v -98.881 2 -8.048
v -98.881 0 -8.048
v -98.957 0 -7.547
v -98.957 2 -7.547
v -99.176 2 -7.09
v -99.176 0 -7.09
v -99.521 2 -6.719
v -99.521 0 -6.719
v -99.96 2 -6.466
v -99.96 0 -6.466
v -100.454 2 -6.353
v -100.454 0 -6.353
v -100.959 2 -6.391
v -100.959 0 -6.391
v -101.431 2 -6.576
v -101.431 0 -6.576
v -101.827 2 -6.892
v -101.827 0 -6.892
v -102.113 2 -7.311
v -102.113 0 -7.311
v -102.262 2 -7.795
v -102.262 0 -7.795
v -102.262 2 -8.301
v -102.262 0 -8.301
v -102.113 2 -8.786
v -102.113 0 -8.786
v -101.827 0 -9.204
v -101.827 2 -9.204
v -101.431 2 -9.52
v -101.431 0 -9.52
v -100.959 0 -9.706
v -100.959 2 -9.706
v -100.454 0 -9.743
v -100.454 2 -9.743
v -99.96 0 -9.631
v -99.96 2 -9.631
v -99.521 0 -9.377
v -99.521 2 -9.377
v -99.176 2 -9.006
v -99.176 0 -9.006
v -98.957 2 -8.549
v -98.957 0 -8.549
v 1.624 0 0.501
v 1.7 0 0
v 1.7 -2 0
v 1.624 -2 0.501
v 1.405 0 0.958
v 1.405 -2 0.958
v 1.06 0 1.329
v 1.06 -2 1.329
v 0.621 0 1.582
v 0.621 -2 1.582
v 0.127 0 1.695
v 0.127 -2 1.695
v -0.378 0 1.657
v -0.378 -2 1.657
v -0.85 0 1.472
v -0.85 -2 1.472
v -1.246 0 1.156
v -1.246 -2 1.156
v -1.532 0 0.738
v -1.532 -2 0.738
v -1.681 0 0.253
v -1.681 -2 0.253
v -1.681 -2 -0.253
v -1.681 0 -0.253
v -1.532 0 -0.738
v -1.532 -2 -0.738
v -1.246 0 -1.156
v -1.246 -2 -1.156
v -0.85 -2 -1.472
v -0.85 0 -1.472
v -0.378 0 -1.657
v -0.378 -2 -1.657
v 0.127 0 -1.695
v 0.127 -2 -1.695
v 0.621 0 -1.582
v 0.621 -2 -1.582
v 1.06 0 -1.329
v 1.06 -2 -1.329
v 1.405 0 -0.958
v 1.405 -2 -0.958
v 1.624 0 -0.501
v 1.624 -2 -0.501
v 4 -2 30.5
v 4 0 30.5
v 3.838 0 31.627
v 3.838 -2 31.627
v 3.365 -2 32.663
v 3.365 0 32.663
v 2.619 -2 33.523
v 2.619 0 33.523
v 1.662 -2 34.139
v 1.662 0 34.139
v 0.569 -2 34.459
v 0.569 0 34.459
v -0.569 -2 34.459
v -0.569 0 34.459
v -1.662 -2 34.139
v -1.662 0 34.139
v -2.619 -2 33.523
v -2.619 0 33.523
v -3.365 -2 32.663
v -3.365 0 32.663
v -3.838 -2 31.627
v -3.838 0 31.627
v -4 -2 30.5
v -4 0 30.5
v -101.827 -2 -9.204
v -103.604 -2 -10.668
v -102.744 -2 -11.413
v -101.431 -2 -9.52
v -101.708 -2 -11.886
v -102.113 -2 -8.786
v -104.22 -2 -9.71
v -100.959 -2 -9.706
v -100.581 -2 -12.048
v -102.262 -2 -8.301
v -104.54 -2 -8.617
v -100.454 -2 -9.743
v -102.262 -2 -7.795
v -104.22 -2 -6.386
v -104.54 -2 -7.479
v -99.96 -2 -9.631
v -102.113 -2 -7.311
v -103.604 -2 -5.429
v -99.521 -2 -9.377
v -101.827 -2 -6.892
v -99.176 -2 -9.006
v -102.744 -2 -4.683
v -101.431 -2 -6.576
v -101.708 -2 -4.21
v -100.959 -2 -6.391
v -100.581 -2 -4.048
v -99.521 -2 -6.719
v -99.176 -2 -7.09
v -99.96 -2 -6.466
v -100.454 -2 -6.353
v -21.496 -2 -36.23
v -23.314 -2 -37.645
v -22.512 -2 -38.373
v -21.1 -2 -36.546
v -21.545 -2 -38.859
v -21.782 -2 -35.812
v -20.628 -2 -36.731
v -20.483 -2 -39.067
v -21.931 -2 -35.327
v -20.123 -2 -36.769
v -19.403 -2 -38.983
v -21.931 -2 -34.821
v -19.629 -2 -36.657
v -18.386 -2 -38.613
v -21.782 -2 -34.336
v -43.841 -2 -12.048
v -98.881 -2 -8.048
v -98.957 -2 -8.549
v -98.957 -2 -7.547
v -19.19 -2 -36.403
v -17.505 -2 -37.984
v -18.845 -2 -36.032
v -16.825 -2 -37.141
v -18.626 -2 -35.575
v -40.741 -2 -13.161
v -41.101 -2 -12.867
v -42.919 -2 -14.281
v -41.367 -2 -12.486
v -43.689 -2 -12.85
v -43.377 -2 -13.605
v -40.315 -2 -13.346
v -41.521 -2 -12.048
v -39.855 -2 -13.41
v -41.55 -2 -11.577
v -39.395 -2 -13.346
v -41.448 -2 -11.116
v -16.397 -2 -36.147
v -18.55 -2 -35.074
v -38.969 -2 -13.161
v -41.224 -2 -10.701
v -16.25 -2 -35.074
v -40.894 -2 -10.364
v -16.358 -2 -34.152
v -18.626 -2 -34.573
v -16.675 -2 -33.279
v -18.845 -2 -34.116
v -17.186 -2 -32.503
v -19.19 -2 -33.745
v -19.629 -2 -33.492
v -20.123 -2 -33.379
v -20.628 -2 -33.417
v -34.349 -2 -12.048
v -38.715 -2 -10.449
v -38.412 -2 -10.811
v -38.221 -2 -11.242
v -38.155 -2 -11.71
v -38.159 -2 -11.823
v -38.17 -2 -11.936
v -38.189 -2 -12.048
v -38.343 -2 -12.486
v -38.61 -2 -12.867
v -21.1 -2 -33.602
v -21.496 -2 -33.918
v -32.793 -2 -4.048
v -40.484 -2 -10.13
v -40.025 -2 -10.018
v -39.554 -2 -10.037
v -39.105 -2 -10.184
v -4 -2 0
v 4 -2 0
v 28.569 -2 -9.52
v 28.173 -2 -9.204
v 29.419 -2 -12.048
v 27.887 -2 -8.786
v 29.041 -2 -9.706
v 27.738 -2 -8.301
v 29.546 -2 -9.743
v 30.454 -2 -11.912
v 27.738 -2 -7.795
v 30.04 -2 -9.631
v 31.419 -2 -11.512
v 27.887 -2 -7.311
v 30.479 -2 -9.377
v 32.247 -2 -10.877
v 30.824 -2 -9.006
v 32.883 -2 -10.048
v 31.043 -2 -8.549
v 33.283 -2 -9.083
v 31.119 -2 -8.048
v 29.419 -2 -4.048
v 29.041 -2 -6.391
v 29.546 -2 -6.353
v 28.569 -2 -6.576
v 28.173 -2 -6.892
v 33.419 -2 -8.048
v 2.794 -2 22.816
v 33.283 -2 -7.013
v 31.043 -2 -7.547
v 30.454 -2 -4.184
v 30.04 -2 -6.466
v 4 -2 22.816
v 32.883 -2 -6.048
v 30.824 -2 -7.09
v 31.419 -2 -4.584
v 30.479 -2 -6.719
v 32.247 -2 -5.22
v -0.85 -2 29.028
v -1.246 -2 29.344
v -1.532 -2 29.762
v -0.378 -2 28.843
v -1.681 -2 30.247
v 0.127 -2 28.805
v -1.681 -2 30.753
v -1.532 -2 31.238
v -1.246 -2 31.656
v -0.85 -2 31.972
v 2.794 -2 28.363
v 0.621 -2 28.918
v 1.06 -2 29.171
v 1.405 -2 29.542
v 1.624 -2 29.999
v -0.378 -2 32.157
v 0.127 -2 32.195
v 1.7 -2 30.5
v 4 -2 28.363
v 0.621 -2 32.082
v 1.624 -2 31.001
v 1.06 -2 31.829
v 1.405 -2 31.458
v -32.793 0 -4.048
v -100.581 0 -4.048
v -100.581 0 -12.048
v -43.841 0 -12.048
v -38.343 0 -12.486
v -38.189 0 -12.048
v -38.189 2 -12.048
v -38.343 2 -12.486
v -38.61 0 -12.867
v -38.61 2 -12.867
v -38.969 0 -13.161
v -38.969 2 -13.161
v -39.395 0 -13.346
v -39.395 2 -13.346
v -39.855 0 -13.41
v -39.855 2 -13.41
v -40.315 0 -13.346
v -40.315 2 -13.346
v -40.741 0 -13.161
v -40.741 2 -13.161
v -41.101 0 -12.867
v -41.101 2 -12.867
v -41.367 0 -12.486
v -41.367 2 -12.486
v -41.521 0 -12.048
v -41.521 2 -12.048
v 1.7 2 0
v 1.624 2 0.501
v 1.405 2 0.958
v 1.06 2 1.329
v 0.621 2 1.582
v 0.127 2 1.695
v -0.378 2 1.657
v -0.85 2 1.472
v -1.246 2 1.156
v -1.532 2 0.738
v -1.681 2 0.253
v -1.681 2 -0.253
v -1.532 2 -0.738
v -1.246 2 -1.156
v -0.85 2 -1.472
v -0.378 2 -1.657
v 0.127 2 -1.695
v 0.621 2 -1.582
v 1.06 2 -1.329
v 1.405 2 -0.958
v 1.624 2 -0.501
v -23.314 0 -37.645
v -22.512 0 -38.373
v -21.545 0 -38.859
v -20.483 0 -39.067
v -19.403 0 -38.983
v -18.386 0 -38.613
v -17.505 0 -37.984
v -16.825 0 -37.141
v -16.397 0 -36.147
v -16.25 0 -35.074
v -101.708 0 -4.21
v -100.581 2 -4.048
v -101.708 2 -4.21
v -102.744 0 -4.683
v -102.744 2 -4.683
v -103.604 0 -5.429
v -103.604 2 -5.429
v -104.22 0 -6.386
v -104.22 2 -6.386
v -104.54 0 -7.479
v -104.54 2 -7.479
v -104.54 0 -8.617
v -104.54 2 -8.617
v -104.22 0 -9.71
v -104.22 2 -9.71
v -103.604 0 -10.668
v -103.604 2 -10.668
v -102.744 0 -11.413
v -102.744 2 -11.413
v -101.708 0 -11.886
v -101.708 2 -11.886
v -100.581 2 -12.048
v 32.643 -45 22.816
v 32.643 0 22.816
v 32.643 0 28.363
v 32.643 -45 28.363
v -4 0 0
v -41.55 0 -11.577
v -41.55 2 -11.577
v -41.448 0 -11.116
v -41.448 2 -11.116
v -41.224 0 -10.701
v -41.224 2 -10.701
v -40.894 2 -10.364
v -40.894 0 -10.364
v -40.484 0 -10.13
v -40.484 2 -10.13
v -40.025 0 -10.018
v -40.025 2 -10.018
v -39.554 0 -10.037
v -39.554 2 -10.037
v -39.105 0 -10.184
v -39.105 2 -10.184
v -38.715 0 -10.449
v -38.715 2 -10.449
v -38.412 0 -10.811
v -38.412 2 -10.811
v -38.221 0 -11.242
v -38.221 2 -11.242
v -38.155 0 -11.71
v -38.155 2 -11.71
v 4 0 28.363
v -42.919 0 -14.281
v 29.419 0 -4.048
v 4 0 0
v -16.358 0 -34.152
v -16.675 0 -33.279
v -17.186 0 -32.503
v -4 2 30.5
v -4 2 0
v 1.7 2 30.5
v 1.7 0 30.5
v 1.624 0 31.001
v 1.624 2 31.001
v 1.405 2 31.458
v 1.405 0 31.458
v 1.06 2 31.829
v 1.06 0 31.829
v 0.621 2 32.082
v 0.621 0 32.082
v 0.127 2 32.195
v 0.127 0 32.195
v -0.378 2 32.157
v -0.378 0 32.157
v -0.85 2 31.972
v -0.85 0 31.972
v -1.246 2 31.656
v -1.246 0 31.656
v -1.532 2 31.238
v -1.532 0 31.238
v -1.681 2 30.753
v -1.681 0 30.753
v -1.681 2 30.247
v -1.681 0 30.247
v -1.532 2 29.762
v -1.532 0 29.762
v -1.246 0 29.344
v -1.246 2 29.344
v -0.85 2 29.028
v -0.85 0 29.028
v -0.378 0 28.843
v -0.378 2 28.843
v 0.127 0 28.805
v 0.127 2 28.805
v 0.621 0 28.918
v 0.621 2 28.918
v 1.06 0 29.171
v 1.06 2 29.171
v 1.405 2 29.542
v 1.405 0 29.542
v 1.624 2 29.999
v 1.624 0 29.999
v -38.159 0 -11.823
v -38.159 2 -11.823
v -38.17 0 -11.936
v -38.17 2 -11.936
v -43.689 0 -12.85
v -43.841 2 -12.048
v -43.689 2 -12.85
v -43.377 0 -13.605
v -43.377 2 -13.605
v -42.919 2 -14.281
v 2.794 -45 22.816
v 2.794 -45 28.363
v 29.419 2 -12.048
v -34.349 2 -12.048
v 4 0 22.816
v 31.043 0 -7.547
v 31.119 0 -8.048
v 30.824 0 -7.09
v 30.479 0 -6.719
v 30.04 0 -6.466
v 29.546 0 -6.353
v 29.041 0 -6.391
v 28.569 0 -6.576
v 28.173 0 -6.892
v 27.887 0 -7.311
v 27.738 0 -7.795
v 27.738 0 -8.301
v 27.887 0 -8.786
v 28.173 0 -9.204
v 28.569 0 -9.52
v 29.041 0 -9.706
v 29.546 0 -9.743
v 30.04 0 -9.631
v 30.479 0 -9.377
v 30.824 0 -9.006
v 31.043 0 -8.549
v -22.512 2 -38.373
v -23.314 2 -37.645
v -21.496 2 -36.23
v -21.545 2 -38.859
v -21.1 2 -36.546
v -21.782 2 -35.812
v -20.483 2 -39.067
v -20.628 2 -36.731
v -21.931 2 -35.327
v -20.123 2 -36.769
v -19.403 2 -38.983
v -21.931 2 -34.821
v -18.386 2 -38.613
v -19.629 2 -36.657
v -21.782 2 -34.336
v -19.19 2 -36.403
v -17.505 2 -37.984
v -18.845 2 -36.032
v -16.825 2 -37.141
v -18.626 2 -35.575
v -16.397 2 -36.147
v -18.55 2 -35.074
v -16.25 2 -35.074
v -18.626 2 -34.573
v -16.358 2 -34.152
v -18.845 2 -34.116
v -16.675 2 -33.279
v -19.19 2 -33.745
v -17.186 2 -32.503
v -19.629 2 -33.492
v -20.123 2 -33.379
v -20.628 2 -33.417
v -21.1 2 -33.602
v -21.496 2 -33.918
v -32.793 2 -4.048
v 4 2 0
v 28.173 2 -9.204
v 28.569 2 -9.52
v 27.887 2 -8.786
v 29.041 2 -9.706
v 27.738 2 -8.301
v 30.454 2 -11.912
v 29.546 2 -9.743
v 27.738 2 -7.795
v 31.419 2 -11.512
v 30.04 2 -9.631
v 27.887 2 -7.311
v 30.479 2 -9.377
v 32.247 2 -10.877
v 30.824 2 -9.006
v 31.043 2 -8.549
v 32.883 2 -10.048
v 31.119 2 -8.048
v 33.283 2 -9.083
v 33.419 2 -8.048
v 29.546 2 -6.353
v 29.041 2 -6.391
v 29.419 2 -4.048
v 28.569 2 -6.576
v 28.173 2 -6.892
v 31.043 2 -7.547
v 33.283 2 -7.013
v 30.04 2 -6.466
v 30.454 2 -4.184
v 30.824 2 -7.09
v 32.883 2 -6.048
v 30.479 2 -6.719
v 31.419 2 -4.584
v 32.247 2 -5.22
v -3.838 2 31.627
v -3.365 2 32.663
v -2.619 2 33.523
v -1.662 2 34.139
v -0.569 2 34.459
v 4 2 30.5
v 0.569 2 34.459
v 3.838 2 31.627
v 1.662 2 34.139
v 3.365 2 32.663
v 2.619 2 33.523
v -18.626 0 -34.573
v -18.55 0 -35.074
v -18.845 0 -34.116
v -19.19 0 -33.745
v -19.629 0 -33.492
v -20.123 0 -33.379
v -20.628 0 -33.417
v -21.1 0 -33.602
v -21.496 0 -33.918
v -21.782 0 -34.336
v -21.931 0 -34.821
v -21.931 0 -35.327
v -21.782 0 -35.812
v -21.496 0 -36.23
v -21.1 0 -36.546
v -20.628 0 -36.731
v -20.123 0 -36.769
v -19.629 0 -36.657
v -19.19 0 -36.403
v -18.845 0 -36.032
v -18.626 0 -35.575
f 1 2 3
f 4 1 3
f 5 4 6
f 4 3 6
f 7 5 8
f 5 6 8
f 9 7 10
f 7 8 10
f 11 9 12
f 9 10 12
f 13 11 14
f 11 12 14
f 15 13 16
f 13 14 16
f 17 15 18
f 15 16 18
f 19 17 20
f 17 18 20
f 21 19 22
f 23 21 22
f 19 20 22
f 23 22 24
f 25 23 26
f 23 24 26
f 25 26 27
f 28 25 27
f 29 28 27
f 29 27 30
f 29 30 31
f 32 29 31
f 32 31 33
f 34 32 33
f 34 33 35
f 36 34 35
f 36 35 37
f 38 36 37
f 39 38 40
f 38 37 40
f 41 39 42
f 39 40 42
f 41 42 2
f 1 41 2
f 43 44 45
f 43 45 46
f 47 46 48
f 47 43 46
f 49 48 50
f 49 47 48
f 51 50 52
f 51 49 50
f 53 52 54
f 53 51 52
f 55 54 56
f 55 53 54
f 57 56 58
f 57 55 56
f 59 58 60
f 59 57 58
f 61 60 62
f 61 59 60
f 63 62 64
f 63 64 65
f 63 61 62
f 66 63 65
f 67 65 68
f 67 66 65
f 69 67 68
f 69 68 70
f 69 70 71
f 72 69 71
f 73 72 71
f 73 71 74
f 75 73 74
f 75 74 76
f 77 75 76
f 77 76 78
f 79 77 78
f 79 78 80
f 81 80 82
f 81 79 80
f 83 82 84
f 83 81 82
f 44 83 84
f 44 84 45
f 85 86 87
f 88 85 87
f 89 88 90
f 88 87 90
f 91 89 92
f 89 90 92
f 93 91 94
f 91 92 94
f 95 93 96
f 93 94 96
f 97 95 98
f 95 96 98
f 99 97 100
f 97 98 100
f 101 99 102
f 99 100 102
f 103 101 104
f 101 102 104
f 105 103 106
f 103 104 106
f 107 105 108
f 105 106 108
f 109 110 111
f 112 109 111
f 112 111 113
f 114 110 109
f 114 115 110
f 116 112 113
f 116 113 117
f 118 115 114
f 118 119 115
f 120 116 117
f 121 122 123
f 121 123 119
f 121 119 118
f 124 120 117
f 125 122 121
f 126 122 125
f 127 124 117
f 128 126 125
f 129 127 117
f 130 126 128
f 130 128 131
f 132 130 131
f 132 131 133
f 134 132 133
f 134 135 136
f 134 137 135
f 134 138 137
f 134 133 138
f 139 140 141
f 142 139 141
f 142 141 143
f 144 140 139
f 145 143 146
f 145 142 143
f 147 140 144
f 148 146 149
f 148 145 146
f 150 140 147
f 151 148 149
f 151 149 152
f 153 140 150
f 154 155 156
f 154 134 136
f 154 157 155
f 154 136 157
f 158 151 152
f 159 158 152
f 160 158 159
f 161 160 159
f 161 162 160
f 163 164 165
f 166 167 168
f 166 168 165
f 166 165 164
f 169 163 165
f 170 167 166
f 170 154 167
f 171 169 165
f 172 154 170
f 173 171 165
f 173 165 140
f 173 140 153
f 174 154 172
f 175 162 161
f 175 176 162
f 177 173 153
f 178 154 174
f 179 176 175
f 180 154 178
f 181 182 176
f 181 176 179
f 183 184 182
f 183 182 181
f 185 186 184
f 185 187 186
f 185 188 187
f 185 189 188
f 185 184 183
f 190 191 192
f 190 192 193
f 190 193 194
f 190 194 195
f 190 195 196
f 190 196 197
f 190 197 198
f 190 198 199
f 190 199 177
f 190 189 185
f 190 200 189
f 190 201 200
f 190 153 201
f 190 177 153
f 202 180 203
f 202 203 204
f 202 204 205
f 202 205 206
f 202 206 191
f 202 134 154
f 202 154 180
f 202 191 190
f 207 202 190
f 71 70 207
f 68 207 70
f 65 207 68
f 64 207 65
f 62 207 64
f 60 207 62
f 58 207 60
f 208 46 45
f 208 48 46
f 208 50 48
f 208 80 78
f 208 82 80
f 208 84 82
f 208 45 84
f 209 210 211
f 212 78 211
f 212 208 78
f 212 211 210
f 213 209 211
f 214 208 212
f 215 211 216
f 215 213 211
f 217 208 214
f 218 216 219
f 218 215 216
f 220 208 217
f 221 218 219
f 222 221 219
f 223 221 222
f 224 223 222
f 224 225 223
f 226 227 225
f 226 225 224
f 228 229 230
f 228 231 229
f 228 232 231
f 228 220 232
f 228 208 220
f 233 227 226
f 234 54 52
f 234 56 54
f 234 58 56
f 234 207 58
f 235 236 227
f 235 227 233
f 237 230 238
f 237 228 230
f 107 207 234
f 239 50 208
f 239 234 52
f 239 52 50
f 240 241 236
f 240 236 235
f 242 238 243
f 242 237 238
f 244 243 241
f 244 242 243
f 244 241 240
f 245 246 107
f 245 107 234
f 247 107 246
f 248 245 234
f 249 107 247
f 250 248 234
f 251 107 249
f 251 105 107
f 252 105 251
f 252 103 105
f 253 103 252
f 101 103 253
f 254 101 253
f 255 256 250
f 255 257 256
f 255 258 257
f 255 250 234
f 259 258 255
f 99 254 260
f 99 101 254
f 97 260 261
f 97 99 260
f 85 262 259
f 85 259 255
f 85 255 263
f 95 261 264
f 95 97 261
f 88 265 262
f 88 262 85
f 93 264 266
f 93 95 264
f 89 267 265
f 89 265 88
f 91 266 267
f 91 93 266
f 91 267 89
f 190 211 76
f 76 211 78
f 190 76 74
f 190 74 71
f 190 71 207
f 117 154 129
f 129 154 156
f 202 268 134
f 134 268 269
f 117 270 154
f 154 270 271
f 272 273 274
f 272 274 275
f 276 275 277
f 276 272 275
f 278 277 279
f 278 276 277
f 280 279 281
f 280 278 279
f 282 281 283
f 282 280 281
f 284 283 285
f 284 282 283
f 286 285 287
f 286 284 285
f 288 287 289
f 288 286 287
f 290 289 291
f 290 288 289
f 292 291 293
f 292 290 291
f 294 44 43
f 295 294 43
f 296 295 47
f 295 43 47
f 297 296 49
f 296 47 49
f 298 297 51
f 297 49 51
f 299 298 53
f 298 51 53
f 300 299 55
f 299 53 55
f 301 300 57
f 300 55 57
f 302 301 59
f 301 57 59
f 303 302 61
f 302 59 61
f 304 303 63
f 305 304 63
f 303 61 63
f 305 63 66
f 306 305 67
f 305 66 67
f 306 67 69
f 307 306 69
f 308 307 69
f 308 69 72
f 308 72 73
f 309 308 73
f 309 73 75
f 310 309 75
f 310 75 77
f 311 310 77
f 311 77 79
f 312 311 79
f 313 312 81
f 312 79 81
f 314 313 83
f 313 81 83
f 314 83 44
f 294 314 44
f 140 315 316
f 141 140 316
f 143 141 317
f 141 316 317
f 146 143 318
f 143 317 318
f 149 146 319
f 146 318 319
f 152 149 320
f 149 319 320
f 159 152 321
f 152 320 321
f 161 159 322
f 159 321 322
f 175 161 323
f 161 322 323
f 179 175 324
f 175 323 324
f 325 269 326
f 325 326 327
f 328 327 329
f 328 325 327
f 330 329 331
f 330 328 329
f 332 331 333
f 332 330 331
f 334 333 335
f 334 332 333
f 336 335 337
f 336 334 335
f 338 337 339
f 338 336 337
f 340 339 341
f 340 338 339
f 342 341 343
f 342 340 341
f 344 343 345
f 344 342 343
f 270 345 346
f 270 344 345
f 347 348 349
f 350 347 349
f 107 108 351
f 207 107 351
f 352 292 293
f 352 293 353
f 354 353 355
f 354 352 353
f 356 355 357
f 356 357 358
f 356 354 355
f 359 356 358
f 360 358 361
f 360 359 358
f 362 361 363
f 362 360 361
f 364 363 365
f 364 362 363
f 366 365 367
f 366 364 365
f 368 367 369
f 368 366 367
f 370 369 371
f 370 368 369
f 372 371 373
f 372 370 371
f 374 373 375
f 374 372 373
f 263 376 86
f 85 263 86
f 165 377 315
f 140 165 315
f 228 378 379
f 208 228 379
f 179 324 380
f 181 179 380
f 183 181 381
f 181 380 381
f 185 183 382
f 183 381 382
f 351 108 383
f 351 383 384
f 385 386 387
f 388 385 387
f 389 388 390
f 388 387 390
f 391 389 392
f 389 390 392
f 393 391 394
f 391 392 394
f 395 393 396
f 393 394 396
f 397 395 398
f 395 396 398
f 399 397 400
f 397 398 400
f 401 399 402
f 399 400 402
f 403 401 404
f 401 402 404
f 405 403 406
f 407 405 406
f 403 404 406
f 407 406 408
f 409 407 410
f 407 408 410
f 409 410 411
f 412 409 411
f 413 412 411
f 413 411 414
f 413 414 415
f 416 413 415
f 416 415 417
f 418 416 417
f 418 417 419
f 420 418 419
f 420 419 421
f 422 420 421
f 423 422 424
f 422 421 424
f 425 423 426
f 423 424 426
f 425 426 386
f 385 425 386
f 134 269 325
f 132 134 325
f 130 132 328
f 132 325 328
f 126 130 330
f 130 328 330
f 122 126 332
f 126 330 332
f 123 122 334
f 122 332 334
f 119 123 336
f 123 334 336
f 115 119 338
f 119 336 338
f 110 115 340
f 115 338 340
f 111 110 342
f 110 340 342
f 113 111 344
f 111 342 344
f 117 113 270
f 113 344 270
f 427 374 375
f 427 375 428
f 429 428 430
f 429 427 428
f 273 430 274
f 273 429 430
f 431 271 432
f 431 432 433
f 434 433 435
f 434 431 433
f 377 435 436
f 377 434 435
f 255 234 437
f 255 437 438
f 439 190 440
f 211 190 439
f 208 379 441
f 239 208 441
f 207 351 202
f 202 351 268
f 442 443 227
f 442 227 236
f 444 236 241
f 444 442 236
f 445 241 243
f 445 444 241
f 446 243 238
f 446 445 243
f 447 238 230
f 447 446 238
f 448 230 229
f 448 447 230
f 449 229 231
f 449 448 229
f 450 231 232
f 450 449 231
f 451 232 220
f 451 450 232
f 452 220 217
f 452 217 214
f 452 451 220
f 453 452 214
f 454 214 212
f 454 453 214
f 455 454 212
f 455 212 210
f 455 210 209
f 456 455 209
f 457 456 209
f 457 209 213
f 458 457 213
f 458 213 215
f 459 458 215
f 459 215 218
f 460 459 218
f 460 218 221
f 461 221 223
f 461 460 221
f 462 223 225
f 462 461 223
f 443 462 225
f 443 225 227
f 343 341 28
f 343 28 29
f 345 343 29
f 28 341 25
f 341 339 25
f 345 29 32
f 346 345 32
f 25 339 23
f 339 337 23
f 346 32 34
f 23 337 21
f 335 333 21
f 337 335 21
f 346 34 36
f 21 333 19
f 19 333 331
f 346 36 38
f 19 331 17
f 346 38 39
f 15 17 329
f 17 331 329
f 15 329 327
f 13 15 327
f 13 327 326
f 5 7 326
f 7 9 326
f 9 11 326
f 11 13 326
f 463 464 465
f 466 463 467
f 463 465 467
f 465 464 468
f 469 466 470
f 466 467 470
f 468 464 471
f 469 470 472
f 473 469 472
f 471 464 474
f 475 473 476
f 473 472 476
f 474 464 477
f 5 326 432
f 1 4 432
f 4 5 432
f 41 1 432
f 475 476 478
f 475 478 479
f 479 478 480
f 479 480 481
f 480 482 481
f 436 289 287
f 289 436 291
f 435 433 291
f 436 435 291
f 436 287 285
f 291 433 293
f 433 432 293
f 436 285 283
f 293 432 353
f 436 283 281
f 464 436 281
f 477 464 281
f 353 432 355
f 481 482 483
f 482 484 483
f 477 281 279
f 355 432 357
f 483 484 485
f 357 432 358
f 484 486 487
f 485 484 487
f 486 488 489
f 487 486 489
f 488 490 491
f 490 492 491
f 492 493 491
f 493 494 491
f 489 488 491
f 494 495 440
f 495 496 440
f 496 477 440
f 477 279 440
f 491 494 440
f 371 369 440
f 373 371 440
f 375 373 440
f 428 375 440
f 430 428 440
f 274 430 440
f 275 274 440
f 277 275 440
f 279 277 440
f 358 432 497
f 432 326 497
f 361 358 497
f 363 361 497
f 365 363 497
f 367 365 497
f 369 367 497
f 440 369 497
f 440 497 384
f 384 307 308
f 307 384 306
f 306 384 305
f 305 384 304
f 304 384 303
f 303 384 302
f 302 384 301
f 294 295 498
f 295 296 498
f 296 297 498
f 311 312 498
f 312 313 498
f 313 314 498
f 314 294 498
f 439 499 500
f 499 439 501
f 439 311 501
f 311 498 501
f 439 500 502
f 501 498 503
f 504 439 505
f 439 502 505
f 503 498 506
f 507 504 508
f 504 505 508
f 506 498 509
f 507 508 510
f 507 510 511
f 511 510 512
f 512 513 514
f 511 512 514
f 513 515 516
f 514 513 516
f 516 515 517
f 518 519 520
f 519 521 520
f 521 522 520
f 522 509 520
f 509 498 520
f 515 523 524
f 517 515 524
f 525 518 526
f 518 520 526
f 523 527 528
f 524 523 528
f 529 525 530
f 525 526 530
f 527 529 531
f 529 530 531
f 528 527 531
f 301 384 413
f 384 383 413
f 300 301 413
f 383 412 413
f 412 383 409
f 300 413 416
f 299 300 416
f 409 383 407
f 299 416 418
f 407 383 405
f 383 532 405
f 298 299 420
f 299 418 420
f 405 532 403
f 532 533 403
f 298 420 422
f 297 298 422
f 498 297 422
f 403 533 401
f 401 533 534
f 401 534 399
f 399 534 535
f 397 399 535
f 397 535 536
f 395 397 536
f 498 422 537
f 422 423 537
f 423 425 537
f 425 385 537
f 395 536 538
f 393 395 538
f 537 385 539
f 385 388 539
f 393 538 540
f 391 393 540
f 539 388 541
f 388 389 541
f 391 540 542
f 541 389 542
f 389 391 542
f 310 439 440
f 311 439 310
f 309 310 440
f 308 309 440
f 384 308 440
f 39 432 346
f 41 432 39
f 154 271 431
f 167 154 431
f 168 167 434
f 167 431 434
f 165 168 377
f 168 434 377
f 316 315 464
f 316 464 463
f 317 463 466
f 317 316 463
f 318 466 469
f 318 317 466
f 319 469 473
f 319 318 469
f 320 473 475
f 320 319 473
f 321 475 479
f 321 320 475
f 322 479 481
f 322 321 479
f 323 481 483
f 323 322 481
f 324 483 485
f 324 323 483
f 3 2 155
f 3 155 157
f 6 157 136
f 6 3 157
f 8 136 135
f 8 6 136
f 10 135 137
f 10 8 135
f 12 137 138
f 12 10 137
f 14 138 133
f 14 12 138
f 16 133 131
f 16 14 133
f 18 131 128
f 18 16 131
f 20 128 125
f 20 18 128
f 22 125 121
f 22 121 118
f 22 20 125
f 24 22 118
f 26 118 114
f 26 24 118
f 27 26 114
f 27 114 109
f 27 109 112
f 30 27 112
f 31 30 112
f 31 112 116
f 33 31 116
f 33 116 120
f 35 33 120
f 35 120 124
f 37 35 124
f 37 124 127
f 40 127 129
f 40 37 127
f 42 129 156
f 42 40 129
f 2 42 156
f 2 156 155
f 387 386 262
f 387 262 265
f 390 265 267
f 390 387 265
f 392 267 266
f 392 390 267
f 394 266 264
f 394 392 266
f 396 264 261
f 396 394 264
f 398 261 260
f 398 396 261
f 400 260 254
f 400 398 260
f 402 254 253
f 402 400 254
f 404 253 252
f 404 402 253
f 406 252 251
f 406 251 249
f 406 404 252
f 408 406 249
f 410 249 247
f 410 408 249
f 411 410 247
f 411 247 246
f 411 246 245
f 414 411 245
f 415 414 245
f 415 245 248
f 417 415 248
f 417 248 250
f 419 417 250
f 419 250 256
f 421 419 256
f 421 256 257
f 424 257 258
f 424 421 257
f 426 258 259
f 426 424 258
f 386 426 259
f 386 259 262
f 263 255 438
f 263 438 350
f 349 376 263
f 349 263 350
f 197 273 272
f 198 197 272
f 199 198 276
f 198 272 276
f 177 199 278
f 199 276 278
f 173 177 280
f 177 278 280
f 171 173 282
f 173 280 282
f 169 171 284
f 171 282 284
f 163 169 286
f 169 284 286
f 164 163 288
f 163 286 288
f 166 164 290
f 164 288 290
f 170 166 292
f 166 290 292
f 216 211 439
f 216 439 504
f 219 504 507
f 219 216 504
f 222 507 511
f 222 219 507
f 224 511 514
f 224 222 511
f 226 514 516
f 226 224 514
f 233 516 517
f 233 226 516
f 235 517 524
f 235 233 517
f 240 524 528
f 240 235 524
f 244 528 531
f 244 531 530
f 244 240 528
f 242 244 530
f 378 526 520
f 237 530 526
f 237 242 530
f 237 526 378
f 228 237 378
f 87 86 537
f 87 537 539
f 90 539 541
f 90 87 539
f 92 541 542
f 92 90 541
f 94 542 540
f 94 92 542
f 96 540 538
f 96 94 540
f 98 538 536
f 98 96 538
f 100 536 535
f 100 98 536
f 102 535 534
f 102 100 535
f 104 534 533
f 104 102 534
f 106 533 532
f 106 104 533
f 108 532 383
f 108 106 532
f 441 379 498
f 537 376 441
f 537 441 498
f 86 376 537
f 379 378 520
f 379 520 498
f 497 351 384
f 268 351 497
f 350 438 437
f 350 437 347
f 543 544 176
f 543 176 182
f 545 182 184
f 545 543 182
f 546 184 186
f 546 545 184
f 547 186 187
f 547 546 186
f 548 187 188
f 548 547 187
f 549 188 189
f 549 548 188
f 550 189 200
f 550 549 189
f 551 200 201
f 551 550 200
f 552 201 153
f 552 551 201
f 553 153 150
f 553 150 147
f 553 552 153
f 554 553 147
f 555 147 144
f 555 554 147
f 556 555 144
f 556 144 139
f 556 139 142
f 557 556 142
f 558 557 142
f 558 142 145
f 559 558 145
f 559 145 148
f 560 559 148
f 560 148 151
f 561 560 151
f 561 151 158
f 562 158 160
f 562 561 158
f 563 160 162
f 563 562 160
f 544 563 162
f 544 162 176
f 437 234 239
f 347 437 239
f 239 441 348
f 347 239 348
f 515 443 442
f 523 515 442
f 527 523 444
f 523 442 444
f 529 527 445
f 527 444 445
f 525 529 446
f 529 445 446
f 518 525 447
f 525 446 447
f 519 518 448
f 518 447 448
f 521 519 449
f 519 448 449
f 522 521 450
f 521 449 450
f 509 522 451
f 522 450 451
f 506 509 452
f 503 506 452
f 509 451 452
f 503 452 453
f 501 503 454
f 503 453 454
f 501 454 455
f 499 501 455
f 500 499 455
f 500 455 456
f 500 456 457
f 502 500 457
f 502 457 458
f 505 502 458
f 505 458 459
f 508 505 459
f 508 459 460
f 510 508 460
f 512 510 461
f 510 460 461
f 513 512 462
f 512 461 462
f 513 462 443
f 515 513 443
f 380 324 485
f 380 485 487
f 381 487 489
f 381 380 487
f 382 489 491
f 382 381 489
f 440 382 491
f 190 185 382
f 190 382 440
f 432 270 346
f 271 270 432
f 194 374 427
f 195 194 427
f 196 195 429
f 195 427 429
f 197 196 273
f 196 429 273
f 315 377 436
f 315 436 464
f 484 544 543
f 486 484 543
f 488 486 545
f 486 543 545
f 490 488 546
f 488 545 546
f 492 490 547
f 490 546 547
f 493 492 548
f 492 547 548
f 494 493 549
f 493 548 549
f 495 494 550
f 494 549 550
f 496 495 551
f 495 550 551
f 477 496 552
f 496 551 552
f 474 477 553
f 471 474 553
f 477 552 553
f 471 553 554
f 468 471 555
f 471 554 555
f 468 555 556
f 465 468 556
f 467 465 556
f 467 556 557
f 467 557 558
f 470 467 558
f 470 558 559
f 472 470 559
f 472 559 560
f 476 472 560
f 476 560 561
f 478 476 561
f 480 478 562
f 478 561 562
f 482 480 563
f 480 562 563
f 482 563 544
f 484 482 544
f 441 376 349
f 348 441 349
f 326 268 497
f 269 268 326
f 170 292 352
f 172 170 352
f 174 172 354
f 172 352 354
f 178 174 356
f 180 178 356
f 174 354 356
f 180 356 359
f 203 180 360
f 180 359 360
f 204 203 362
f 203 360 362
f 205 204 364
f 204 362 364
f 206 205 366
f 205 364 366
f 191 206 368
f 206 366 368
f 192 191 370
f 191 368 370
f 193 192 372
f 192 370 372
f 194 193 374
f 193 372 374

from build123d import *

# Parameters (mm, degrees)
F1_R     = 1.7
F2_DEPTH = 2
F3_W     = 29.8484290563
F3_H     = 5.5467073855
F4_DEPTH = 45


with BuildPart() as f2:
    # F1 (on Front) → F2 (new body, symmetric)
    with BuildSketch(Plane.XZ):
        with BuildLine():
            ThreePointArc((-41.5209898099, -12.0481280239), (-40.0251027901, -10.0182028071), (-38.1550220954, -11.7096733381))
            ThreePointArc((-38.1550220954, -11.7096733381), (-38.1635515644, -11.8797540328), (-38.189054381, -12.0481280239))
            Line((-38.189054381, -12.0481280239), (-35.8693667634, -12.0481280239))
            ThreePointArc((-35.8693667634, -12.0481280239), (-35.8586098715, -11.8790526048), (-35.8550220954, -11.7096733381))
            ThreePointArc((-35.8550220954, -11.7096733381), (-36.0962516123, -10.3415927648), (-36.790844323, -9.1385228994))
            ThreePointArc((-36.790844323, -9.1385228994), (-41.381040024, -8.0122053827), (-43.8406774275, -12.0481280239))
            Line((-43.8406774275, -12.0481280239), (-41.5209898099, -12.0481280239))
        make_face()
        with BuildLine():
            ThreePointArc((-38.189054381, -12.0481280239), (-39.8550220954, -13.4096733381), (-41.5209898099, -12.0481280239))
            Line((-41.5209898099, -12.0481280239), (-43.8406774275, -12.0481280239))
            ThreePointArc((-43.8406774275, -12.0481280239), (-43.5524900509, -13.2356912667), (-42.9191998679, -14.2808237769))
            ThreePointArc((-42.9191998679, -14.2808237769), (-38.6473330608, -15.5230035357), (-35.8693667634, -12.0481280239))
            Line((-35.8693667634, -12.0481280239), (-38.189054381, -12.0481280239))
        make_face()
        with BuildLine():
            Line((-100.580998737, -12.0481280239), (-43.8406774275, -12.0481280239))
            ThreePointArc((-43.8406774275, -12.0481280239), (-41.381040024, -8.0122053827), (-36.790844323, -9.1385228994))
            Line((-36.790844323, -9.1385228994), (-34.3493957361, -12.0481280239))
            Line((-34.3493957361, -12.0481280239), (29.419001263, -12.0481280239))
            ThreePointArc((29.419001263, -12.0481280239), (25.419001263, -8.0481280239), (29.419001263, -4.0481280239))
            Line((29.419001263, -4.0481280239), (-32.7925062924, -4.0481280239))
            Line((-32.7925062924, -4.0481280239), (-100.580998737, -4.0481280239))
            ThreePointArc((-100.580998737, -4.0481280239), (-97.7525716123, -5.2197008992), (-96.580998737, -8.0481280239))
            ThreePointArc((-96.580998737, -8.0481280239), (-97.7525716123, -10.8765551487), (-100.580998737, -12.0481280239))
        make_face()
        with BuildLine():
            ThreePointArc((-35.8550220954, -11.7096733381), (-35.8586098715, -11.8790526048), (-35.8693667634, -12.0481280239))
            Line((-35.8693667634, -12.0481280239), (-34.3493957361, -12.0481280239))
            Line((-34.3493957361, -12.0481280239), (-36.790844323, -9.1385228994))
            ThreePointArc((-36.790844323, -9.1385228994), (-36.0962516123, -10.3415927648), (-35.8550220954, -11.7096733381))
        make_face()
        with BuildLine():
            Line((-34.3493957361, -12.0481280239), (-35.8693667634, -12.0481280239))
            ThreePointArc((-35.8693667634, -12.0481280239), (-38.6473330608, -15.5230035357), (-42.9191998679, -14.2808237769))
            Line((-42.9191998679, -14.2808237769), (-23.3141777725, -37.645179292))
            ThreePointArc((-23.3141777725, -37.645179292), (-22.8211504387, -32.0098510808), (-17.1858222275, -32.5028784145))
            Line((-17.1858222275, -32.5028784145), (-34.3493957361, -12.0481280239))
        make_face()
        with BuildLine():
            ThreePointArc((-100.580998737, -4.0481280239), (-104.580998737, -8.0481280239), (-100.580998737, -12.0481280239))
            ThreePointArc((-100.580998737, -12.0481280239), (-97.7525716123, -10.8765551487), (-96.580998737, -8.0481280239))
            ThreePointArc((-96.580998737, -8.0481280239), (-97.7525716123, -5.2197008992), (-100.580998737, -4.0481280239))
        make_face()
        with Locations((-100.580998737, -8.0481280239)):
            Circle(F1_R, mode=Mode.SUBTRACT)
        with BuildLine():
            ThreePointArc((-17.1858222275, -32.5028784145), (-22.8211504387, -32.0098510808), (-23.3141777725, -37.645179292))
            ThreePointArc((-23.3141777725, -37.645179292), (-18.8819194267, -38.8327993364), (-16.25, -35.0740288533))
            ThreePointArc((-16.25, -35.0740288533), (-16.4912295169, -33.70594828), (-17.1858222275, -32.5028784145))
        make_face()
        with Locations((-20.25, -35.0740288533)):
            Circle(F1_R, mode=Mode.SUBTRACT)
        with BuildLine():
            ThreePointArc((29.419001263, -4.0481280239), (25.419001263, -8.0481280239), (29.419001263, -12.0481280239))
            ThreePointArc((29.419001263, -12.0481280239), (32.2474283877, -10.8765551487), (33.419001263, -8.0481280239))
            ThreePointArc((33.419001263, -8.0481280239), (32.2474283877, -5.2197008992), (29.419001263, -4.0481280239))
        make_face()
        with Locations((29.419001263, -8.0481280239)):
            Circle(F1_R, mode=Mode.SUBTRACT)
        with BuildLine():
            Line((-4, 0), (-32.7925062924, -4.0481280239))
            Line((-32.7925062924, -4.0481280239), (29.419001263, -4.0481280239))
            Line((29.419001263, -4.0481280239), (4, 0))
            ThreePointArc((4, 0), (0, -4), (-4, 0))
        make_face()
        with BuildLine():
            Line((-4, 30.5), (-4, 0))
            ThreePointArc((-4, 0), (0, 4), (4, 0))
            Line((4, 0), (4, 30.5))
            ThreePointArc((4, 30.5), (0, 26.5), (-4, 30.5))
        make_face()
        with BuildLine():
            ThreePointArc((4, 0), (0, 4), (-4, 0))
            ThreePointArc((-4, 0), (0, -4), (4, 0))
        make_face()
        Circle(F1_R, mode=Mode.SUBTRACT)
        with BuildLine():
            ThreePointArc((4, 30.5), (0, 34.5), (-4, 30.5))
            ThreePointArc((-4, 30.5), (0, 26.5), (4, 30.5))
        make_face()
        with Locations((0, 30.5)):
            Circle(F1_R, mode=Mode.SUBTRACT)
    extrude(amount=F2_DEPTH, both=True)

    # F3 (on Front) → F4 (join)
    with BuildSketch(Plane.XZ):
        with Locations((17.7185675129, 25.5892256688)):
            Rectangle(F3_W, F3_H)
    extrude(amount=F4_DEPTH)


solid = f2.part
